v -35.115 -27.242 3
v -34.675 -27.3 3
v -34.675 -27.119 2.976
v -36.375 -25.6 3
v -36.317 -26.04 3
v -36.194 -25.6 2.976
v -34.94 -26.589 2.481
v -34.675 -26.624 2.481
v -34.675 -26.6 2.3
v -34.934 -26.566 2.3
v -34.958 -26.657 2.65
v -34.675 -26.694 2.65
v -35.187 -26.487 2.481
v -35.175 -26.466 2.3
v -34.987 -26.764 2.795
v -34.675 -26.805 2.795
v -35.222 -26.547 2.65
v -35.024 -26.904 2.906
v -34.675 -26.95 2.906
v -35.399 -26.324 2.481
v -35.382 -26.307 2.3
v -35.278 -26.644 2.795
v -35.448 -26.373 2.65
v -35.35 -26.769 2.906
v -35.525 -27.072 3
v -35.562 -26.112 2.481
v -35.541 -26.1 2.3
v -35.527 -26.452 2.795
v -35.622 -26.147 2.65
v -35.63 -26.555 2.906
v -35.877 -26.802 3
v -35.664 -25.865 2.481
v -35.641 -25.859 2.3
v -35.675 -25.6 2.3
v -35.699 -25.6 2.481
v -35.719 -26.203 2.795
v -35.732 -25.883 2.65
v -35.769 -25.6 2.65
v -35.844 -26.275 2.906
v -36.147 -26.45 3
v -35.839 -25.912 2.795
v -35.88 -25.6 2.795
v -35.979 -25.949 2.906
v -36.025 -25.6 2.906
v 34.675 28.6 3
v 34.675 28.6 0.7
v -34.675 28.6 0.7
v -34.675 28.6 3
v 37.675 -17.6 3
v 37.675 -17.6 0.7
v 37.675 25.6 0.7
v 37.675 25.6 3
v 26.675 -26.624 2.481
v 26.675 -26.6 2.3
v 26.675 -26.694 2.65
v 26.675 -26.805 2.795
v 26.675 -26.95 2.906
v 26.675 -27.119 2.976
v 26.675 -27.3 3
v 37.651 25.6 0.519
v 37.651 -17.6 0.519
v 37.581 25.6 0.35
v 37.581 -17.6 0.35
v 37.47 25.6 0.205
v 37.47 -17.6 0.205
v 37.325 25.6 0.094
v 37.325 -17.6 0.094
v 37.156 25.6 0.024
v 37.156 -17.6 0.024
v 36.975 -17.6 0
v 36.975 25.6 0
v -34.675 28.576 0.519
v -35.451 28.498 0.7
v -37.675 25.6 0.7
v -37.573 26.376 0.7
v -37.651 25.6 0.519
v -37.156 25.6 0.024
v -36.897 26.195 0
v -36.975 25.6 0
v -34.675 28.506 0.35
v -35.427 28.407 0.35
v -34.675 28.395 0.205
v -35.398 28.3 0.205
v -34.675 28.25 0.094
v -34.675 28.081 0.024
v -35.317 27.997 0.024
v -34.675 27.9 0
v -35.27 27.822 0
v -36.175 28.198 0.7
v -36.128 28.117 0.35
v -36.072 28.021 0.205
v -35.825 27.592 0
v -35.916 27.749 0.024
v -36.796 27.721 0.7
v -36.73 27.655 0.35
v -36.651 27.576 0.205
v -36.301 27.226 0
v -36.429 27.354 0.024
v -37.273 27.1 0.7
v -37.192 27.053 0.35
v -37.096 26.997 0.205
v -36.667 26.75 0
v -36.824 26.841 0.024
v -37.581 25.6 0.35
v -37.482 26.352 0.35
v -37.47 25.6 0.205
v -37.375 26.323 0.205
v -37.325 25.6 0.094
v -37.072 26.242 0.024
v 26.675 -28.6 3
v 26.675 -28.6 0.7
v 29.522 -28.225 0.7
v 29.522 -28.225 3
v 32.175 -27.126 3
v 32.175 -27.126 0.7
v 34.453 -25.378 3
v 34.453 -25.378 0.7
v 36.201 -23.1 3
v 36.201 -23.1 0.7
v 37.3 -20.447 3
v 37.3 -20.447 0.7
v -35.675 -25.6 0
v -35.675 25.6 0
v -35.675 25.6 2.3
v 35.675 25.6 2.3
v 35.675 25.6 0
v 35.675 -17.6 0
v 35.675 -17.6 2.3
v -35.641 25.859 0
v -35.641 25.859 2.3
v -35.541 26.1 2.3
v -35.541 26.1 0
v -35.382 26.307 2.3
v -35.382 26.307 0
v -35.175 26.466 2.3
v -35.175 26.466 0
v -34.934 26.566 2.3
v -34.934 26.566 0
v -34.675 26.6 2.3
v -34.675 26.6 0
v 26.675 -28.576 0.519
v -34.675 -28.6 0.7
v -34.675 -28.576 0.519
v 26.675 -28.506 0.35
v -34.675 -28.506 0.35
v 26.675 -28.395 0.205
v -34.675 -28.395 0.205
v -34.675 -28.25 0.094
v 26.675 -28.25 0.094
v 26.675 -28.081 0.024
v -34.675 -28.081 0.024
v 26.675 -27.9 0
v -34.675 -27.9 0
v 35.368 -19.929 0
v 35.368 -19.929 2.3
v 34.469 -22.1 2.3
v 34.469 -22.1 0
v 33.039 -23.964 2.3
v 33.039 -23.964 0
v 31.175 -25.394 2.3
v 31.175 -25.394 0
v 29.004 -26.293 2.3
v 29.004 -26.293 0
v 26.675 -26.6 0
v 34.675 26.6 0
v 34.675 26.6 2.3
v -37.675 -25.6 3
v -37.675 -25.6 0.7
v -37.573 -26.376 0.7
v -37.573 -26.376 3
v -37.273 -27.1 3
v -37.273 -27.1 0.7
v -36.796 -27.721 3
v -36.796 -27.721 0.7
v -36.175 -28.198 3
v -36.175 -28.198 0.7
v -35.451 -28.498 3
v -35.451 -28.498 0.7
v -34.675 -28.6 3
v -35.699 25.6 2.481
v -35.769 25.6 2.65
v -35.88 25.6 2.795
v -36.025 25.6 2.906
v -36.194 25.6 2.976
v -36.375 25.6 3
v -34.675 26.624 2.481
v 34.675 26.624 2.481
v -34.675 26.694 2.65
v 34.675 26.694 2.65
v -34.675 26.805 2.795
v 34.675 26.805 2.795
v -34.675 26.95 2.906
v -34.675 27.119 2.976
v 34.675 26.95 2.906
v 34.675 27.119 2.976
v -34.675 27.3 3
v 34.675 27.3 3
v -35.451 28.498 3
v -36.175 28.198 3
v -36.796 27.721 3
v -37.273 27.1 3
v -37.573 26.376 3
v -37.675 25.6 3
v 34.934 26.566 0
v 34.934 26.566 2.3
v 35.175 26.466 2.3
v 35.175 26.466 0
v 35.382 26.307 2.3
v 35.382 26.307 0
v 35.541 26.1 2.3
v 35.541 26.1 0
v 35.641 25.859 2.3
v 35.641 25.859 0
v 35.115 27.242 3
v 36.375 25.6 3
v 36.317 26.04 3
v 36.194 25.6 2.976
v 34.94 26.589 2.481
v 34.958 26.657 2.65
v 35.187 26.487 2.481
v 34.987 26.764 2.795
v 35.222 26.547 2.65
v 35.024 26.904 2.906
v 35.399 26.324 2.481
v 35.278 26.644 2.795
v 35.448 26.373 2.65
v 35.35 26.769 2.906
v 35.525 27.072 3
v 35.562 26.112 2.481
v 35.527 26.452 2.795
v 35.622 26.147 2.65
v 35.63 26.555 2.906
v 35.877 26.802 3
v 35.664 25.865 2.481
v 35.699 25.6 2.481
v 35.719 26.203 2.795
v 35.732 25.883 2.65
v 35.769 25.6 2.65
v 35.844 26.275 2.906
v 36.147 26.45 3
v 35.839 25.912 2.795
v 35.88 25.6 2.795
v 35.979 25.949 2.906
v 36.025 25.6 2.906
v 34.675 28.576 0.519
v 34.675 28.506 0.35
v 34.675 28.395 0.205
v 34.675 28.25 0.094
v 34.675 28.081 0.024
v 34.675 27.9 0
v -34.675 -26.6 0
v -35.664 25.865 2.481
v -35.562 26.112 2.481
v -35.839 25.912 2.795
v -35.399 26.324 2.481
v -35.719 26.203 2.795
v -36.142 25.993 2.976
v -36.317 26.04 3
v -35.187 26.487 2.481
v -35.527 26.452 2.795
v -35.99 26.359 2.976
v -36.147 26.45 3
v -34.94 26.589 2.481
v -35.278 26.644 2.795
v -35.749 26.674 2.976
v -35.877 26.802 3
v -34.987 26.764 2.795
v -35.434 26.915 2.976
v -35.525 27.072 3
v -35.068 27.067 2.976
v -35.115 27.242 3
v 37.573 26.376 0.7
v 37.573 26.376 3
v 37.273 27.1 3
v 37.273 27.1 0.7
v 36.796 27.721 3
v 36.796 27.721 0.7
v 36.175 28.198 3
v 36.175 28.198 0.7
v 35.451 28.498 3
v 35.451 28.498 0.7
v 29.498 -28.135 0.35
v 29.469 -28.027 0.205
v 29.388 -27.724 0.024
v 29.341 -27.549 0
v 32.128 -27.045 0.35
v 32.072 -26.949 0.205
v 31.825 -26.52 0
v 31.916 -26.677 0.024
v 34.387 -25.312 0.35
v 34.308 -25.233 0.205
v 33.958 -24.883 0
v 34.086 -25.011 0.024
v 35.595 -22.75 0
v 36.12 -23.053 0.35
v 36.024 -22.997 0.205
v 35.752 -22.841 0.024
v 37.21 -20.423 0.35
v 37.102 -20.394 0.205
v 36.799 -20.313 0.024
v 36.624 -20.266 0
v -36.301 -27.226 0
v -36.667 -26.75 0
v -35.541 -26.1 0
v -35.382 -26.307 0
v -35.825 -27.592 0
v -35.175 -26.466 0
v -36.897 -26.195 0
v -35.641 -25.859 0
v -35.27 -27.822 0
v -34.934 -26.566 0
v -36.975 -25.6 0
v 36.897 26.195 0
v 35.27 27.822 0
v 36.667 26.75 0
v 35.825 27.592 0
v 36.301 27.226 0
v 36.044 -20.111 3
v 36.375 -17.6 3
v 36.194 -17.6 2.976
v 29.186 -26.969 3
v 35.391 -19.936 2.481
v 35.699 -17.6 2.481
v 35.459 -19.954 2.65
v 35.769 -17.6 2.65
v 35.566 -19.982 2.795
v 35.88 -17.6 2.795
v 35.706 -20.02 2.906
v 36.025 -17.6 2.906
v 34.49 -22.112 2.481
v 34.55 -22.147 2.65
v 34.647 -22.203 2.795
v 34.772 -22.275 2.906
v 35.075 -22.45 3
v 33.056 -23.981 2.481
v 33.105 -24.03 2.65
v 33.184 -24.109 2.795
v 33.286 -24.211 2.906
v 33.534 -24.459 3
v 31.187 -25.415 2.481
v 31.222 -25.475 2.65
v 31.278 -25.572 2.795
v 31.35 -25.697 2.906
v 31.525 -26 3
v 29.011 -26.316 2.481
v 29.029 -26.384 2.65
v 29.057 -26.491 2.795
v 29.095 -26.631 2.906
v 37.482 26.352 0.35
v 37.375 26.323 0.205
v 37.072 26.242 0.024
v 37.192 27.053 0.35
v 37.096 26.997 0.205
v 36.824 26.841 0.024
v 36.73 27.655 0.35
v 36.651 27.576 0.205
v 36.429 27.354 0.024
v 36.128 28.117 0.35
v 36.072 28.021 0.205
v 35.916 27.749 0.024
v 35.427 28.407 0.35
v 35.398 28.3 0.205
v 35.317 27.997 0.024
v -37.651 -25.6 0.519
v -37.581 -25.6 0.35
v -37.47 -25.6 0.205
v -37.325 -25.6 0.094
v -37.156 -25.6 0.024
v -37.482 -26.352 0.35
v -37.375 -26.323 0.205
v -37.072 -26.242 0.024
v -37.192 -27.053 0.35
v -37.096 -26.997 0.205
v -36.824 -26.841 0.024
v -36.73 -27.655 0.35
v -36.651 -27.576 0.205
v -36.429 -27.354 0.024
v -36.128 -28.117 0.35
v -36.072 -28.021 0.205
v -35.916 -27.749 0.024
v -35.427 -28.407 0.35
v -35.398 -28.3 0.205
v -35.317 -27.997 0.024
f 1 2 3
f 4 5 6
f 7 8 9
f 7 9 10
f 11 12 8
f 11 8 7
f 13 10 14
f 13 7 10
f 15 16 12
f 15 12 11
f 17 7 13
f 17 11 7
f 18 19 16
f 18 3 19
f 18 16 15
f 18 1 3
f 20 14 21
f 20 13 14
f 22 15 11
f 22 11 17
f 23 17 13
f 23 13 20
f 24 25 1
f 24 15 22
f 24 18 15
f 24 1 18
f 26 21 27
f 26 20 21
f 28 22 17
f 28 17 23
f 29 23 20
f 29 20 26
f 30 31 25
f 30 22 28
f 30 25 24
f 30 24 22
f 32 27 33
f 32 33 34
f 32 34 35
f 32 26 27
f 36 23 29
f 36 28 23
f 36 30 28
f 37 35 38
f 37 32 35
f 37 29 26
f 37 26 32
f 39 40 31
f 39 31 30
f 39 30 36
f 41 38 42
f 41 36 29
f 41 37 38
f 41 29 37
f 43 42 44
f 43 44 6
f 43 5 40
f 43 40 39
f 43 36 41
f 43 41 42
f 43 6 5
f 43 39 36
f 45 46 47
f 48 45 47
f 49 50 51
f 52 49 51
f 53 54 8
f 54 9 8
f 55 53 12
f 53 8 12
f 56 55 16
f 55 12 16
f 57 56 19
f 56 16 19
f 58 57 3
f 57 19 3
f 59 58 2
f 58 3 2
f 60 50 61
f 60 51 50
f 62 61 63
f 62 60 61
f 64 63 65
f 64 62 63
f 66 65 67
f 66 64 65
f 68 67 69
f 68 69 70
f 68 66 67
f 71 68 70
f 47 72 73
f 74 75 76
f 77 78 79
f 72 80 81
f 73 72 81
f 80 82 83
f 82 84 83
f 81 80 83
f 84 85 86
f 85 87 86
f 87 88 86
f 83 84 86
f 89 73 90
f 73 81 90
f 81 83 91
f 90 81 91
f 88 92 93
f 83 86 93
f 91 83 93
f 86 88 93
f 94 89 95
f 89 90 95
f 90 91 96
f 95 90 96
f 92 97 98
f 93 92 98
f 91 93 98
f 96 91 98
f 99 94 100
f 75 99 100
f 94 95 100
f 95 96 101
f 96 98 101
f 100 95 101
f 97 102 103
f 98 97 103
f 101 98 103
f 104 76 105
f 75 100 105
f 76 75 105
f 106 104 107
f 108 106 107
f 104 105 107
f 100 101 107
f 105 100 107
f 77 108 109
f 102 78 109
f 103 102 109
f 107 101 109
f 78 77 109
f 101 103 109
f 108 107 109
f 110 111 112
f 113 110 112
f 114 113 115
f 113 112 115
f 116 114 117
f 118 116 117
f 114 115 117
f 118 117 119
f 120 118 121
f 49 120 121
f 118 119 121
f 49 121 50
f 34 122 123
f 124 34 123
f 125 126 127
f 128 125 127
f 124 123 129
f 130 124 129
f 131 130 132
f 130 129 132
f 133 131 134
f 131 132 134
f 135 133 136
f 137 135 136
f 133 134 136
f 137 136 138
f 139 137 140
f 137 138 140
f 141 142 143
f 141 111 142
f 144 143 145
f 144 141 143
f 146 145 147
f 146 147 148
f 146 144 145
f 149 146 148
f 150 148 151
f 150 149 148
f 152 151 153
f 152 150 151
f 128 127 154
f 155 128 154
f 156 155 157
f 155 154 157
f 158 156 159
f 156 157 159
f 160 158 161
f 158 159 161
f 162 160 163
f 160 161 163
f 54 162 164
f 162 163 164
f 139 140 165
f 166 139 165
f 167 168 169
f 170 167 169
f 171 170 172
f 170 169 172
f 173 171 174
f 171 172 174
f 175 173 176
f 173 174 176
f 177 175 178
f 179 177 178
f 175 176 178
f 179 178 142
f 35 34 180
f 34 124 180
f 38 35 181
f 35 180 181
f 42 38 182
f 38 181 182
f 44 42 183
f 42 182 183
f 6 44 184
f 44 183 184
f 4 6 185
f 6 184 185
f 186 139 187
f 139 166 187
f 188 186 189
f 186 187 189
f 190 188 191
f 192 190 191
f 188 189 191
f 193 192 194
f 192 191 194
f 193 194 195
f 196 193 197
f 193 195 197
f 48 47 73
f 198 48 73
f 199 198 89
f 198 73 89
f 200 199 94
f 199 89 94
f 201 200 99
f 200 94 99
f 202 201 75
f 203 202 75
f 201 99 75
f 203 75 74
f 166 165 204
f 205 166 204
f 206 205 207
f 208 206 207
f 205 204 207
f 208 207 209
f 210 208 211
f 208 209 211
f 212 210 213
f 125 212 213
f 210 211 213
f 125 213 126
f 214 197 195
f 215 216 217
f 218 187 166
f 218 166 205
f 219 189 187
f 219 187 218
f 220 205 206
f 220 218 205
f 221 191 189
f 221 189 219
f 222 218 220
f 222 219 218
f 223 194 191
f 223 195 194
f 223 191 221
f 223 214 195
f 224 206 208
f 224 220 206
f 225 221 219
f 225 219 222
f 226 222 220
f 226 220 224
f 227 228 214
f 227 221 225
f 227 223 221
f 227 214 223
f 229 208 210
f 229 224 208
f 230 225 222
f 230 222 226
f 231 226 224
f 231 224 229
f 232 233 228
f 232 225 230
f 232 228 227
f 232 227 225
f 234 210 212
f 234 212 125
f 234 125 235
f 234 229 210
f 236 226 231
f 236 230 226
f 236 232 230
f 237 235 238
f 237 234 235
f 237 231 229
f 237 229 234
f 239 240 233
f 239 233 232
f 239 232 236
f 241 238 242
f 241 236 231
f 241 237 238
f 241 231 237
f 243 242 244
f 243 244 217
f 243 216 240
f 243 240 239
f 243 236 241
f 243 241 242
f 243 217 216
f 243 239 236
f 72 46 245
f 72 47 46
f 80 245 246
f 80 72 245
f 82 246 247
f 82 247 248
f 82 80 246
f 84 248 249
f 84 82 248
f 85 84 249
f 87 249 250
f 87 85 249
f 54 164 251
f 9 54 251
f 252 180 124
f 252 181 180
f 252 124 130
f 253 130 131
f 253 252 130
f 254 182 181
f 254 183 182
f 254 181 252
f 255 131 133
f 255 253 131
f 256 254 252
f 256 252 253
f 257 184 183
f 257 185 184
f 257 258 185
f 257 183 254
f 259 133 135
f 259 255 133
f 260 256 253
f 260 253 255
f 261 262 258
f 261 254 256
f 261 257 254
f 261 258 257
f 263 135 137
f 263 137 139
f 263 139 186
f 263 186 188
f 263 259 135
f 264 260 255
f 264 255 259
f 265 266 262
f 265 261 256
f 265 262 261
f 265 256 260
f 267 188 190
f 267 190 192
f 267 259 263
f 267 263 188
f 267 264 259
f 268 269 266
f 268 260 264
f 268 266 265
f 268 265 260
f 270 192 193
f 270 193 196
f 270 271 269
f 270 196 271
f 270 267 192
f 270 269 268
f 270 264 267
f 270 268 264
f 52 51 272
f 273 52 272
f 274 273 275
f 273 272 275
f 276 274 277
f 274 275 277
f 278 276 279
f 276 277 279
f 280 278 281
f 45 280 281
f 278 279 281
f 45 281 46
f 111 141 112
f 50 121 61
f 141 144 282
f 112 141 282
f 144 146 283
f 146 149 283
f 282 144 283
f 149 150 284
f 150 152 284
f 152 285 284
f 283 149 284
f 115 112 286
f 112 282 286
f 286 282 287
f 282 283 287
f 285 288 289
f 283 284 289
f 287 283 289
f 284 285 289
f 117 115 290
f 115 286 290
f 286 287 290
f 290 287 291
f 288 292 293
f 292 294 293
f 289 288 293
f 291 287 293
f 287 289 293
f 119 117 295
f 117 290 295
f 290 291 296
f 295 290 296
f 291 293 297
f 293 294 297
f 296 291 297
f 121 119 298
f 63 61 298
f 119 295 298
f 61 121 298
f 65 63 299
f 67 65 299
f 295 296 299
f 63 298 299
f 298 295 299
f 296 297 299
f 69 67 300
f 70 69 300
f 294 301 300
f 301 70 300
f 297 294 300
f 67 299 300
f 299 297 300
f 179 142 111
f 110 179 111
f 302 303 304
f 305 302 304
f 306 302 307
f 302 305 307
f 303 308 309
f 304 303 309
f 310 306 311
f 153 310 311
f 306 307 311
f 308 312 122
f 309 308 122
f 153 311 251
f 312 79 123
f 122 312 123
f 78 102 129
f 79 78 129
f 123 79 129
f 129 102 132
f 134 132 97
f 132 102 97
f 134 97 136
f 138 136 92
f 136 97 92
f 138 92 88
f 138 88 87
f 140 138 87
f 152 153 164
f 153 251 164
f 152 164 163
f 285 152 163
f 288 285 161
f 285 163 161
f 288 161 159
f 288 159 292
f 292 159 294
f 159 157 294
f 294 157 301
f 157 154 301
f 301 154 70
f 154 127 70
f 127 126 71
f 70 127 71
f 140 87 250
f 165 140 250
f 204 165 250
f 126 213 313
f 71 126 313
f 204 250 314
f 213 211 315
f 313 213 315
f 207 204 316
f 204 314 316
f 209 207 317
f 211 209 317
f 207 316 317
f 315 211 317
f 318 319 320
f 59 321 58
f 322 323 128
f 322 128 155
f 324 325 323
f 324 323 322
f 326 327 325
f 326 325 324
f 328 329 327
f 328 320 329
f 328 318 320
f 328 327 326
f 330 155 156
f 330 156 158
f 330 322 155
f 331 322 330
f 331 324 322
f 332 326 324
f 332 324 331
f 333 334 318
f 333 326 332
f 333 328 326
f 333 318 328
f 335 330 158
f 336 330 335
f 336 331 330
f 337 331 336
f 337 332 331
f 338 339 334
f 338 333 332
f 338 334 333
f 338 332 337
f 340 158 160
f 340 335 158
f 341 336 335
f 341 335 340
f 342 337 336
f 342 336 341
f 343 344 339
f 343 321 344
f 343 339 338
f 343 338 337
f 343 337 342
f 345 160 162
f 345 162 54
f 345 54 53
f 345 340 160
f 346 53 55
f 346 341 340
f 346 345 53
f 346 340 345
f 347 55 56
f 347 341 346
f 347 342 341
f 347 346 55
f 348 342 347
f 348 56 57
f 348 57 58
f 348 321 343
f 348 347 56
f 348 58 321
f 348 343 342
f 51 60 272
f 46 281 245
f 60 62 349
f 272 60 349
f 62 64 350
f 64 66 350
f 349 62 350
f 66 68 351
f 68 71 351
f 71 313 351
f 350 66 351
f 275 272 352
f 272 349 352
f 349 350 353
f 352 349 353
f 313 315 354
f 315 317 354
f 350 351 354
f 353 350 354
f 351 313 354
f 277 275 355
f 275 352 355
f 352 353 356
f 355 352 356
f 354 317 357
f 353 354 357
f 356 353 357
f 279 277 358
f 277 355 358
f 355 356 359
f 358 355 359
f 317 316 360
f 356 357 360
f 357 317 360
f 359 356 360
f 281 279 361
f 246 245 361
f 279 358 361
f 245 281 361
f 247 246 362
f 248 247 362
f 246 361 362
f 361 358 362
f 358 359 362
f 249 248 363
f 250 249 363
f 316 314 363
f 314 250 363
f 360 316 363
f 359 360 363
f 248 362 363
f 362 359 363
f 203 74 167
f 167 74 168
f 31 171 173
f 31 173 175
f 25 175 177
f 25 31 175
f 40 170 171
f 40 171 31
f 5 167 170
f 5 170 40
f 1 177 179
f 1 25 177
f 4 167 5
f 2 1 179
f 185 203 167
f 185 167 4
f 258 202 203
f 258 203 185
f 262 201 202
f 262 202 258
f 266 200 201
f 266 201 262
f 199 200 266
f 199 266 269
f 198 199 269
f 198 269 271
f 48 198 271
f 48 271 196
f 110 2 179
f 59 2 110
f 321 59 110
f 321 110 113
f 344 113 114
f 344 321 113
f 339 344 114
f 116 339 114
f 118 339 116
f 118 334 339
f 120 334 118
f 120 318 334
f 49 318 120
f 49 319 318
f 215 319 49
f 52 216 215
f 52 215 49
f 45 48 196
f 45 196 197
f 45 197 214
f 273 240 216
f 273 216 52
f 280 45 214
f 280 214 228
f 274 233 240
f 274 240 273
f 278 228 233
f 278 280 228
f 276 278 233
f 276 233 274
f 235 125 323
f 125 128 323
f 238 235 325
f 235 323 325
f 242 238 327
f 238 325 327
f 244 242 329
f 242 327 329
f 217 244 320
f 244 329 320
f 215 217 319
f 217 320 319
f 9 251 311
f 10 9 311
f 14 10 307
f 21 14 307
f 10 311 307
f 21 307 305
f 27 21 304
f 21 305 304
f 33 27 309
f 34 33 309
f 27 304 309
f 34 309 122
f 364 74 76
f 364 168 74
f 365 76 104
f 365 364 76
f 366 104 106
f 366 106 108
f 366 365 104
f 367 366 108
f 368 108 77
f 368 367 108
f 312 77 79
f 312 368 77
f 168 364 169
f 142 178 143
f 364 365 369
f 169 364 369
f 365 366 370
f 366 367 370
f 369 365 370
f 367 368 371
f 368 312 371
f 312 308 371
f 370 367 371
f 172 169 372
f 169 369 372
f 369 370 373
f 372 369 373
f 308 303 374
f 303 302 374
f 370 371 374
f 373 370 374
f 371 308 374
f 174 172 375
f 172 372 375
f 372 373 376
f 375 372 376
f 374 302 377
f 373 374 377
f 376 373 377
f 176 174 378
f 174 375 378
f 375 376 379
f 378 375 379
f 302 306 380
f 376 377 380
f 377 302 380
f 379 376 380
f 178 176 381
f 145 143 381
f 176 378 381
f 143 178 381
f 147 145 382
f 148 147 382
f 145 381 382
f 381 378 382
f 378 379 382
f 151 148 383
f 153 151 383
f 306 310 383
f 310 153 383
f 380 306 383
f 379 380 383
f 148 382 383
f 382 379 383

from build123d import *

# Parameters (mm, degrees)
F1_DEPTH = 3
F2_R     = 0.7


with BuildPart() as f1:
    # F0 (on Top) → F1 (new body)
    with BuildSketch(Plane.XY):
        with BuildLine():
            ThreePointArc((37.675, 25.6), (36.79632, 27.72132), (34.675, 28.6))
            Line((34.675, 28.6), (-34.675, 28.6))
            ThreePointArc((-34.675, 28.6), (-36.79632, 27.72132), (-37.675, 25.6))
            Line((-37.675, 25.6), (-37.675, -25.6))
            ThreePointArc((-37.675, -25.6), (-36.79632, -27.72132), (-34.675, -28.6))
            Line((-34.675, -28.6), (26.675, -28.6))
            ThreePointArc((26.675, -28.6), (34.453175, -25.378175), (37.675, -17.6))
            Line((37.675, -17.6), (37.675, 25.6))
        make_face()
        with BuildLine():
            ThreePointArc((34.675, 26.6), (35.382107, 26.307107), (35.675, 25.6))
            Line((35.675, 25.6), (35.675, -17.6))
            ThreePointArc((35.675, -17.6), (33.038961, -23.963961), (26.675, -26.6))
            Line((26.675, -26.6), (-34.675, -26.6))
            ThreePointArc((-34.675, -26.6), (-35.382107, -26.307107), (-35.675, -25.6))
            Line((-35.675, -25.6), (-35.675, 25.6))
            ThreePointArc((-35.675, 25.6), (-35.382107, 26.307107), (-34.675, 26.6))
            Line((-34.675, 26.6), (34.675, 26.6))
        make_face(mode=Mode.SUBTRACT)
    extrude(amount=F1_DEPTH)

    # F2
    f2_edges = [f1.edges().sort_by_distance(p)[0] for p in [
        (-37.675, 0, 0),
        (0, 26.6, 3),
        (-35.675, 0, 3),
        (35.675, 4, 3),
    ]]
    fillet(f2_edges, radius=F2_R)


solid = f1.part
